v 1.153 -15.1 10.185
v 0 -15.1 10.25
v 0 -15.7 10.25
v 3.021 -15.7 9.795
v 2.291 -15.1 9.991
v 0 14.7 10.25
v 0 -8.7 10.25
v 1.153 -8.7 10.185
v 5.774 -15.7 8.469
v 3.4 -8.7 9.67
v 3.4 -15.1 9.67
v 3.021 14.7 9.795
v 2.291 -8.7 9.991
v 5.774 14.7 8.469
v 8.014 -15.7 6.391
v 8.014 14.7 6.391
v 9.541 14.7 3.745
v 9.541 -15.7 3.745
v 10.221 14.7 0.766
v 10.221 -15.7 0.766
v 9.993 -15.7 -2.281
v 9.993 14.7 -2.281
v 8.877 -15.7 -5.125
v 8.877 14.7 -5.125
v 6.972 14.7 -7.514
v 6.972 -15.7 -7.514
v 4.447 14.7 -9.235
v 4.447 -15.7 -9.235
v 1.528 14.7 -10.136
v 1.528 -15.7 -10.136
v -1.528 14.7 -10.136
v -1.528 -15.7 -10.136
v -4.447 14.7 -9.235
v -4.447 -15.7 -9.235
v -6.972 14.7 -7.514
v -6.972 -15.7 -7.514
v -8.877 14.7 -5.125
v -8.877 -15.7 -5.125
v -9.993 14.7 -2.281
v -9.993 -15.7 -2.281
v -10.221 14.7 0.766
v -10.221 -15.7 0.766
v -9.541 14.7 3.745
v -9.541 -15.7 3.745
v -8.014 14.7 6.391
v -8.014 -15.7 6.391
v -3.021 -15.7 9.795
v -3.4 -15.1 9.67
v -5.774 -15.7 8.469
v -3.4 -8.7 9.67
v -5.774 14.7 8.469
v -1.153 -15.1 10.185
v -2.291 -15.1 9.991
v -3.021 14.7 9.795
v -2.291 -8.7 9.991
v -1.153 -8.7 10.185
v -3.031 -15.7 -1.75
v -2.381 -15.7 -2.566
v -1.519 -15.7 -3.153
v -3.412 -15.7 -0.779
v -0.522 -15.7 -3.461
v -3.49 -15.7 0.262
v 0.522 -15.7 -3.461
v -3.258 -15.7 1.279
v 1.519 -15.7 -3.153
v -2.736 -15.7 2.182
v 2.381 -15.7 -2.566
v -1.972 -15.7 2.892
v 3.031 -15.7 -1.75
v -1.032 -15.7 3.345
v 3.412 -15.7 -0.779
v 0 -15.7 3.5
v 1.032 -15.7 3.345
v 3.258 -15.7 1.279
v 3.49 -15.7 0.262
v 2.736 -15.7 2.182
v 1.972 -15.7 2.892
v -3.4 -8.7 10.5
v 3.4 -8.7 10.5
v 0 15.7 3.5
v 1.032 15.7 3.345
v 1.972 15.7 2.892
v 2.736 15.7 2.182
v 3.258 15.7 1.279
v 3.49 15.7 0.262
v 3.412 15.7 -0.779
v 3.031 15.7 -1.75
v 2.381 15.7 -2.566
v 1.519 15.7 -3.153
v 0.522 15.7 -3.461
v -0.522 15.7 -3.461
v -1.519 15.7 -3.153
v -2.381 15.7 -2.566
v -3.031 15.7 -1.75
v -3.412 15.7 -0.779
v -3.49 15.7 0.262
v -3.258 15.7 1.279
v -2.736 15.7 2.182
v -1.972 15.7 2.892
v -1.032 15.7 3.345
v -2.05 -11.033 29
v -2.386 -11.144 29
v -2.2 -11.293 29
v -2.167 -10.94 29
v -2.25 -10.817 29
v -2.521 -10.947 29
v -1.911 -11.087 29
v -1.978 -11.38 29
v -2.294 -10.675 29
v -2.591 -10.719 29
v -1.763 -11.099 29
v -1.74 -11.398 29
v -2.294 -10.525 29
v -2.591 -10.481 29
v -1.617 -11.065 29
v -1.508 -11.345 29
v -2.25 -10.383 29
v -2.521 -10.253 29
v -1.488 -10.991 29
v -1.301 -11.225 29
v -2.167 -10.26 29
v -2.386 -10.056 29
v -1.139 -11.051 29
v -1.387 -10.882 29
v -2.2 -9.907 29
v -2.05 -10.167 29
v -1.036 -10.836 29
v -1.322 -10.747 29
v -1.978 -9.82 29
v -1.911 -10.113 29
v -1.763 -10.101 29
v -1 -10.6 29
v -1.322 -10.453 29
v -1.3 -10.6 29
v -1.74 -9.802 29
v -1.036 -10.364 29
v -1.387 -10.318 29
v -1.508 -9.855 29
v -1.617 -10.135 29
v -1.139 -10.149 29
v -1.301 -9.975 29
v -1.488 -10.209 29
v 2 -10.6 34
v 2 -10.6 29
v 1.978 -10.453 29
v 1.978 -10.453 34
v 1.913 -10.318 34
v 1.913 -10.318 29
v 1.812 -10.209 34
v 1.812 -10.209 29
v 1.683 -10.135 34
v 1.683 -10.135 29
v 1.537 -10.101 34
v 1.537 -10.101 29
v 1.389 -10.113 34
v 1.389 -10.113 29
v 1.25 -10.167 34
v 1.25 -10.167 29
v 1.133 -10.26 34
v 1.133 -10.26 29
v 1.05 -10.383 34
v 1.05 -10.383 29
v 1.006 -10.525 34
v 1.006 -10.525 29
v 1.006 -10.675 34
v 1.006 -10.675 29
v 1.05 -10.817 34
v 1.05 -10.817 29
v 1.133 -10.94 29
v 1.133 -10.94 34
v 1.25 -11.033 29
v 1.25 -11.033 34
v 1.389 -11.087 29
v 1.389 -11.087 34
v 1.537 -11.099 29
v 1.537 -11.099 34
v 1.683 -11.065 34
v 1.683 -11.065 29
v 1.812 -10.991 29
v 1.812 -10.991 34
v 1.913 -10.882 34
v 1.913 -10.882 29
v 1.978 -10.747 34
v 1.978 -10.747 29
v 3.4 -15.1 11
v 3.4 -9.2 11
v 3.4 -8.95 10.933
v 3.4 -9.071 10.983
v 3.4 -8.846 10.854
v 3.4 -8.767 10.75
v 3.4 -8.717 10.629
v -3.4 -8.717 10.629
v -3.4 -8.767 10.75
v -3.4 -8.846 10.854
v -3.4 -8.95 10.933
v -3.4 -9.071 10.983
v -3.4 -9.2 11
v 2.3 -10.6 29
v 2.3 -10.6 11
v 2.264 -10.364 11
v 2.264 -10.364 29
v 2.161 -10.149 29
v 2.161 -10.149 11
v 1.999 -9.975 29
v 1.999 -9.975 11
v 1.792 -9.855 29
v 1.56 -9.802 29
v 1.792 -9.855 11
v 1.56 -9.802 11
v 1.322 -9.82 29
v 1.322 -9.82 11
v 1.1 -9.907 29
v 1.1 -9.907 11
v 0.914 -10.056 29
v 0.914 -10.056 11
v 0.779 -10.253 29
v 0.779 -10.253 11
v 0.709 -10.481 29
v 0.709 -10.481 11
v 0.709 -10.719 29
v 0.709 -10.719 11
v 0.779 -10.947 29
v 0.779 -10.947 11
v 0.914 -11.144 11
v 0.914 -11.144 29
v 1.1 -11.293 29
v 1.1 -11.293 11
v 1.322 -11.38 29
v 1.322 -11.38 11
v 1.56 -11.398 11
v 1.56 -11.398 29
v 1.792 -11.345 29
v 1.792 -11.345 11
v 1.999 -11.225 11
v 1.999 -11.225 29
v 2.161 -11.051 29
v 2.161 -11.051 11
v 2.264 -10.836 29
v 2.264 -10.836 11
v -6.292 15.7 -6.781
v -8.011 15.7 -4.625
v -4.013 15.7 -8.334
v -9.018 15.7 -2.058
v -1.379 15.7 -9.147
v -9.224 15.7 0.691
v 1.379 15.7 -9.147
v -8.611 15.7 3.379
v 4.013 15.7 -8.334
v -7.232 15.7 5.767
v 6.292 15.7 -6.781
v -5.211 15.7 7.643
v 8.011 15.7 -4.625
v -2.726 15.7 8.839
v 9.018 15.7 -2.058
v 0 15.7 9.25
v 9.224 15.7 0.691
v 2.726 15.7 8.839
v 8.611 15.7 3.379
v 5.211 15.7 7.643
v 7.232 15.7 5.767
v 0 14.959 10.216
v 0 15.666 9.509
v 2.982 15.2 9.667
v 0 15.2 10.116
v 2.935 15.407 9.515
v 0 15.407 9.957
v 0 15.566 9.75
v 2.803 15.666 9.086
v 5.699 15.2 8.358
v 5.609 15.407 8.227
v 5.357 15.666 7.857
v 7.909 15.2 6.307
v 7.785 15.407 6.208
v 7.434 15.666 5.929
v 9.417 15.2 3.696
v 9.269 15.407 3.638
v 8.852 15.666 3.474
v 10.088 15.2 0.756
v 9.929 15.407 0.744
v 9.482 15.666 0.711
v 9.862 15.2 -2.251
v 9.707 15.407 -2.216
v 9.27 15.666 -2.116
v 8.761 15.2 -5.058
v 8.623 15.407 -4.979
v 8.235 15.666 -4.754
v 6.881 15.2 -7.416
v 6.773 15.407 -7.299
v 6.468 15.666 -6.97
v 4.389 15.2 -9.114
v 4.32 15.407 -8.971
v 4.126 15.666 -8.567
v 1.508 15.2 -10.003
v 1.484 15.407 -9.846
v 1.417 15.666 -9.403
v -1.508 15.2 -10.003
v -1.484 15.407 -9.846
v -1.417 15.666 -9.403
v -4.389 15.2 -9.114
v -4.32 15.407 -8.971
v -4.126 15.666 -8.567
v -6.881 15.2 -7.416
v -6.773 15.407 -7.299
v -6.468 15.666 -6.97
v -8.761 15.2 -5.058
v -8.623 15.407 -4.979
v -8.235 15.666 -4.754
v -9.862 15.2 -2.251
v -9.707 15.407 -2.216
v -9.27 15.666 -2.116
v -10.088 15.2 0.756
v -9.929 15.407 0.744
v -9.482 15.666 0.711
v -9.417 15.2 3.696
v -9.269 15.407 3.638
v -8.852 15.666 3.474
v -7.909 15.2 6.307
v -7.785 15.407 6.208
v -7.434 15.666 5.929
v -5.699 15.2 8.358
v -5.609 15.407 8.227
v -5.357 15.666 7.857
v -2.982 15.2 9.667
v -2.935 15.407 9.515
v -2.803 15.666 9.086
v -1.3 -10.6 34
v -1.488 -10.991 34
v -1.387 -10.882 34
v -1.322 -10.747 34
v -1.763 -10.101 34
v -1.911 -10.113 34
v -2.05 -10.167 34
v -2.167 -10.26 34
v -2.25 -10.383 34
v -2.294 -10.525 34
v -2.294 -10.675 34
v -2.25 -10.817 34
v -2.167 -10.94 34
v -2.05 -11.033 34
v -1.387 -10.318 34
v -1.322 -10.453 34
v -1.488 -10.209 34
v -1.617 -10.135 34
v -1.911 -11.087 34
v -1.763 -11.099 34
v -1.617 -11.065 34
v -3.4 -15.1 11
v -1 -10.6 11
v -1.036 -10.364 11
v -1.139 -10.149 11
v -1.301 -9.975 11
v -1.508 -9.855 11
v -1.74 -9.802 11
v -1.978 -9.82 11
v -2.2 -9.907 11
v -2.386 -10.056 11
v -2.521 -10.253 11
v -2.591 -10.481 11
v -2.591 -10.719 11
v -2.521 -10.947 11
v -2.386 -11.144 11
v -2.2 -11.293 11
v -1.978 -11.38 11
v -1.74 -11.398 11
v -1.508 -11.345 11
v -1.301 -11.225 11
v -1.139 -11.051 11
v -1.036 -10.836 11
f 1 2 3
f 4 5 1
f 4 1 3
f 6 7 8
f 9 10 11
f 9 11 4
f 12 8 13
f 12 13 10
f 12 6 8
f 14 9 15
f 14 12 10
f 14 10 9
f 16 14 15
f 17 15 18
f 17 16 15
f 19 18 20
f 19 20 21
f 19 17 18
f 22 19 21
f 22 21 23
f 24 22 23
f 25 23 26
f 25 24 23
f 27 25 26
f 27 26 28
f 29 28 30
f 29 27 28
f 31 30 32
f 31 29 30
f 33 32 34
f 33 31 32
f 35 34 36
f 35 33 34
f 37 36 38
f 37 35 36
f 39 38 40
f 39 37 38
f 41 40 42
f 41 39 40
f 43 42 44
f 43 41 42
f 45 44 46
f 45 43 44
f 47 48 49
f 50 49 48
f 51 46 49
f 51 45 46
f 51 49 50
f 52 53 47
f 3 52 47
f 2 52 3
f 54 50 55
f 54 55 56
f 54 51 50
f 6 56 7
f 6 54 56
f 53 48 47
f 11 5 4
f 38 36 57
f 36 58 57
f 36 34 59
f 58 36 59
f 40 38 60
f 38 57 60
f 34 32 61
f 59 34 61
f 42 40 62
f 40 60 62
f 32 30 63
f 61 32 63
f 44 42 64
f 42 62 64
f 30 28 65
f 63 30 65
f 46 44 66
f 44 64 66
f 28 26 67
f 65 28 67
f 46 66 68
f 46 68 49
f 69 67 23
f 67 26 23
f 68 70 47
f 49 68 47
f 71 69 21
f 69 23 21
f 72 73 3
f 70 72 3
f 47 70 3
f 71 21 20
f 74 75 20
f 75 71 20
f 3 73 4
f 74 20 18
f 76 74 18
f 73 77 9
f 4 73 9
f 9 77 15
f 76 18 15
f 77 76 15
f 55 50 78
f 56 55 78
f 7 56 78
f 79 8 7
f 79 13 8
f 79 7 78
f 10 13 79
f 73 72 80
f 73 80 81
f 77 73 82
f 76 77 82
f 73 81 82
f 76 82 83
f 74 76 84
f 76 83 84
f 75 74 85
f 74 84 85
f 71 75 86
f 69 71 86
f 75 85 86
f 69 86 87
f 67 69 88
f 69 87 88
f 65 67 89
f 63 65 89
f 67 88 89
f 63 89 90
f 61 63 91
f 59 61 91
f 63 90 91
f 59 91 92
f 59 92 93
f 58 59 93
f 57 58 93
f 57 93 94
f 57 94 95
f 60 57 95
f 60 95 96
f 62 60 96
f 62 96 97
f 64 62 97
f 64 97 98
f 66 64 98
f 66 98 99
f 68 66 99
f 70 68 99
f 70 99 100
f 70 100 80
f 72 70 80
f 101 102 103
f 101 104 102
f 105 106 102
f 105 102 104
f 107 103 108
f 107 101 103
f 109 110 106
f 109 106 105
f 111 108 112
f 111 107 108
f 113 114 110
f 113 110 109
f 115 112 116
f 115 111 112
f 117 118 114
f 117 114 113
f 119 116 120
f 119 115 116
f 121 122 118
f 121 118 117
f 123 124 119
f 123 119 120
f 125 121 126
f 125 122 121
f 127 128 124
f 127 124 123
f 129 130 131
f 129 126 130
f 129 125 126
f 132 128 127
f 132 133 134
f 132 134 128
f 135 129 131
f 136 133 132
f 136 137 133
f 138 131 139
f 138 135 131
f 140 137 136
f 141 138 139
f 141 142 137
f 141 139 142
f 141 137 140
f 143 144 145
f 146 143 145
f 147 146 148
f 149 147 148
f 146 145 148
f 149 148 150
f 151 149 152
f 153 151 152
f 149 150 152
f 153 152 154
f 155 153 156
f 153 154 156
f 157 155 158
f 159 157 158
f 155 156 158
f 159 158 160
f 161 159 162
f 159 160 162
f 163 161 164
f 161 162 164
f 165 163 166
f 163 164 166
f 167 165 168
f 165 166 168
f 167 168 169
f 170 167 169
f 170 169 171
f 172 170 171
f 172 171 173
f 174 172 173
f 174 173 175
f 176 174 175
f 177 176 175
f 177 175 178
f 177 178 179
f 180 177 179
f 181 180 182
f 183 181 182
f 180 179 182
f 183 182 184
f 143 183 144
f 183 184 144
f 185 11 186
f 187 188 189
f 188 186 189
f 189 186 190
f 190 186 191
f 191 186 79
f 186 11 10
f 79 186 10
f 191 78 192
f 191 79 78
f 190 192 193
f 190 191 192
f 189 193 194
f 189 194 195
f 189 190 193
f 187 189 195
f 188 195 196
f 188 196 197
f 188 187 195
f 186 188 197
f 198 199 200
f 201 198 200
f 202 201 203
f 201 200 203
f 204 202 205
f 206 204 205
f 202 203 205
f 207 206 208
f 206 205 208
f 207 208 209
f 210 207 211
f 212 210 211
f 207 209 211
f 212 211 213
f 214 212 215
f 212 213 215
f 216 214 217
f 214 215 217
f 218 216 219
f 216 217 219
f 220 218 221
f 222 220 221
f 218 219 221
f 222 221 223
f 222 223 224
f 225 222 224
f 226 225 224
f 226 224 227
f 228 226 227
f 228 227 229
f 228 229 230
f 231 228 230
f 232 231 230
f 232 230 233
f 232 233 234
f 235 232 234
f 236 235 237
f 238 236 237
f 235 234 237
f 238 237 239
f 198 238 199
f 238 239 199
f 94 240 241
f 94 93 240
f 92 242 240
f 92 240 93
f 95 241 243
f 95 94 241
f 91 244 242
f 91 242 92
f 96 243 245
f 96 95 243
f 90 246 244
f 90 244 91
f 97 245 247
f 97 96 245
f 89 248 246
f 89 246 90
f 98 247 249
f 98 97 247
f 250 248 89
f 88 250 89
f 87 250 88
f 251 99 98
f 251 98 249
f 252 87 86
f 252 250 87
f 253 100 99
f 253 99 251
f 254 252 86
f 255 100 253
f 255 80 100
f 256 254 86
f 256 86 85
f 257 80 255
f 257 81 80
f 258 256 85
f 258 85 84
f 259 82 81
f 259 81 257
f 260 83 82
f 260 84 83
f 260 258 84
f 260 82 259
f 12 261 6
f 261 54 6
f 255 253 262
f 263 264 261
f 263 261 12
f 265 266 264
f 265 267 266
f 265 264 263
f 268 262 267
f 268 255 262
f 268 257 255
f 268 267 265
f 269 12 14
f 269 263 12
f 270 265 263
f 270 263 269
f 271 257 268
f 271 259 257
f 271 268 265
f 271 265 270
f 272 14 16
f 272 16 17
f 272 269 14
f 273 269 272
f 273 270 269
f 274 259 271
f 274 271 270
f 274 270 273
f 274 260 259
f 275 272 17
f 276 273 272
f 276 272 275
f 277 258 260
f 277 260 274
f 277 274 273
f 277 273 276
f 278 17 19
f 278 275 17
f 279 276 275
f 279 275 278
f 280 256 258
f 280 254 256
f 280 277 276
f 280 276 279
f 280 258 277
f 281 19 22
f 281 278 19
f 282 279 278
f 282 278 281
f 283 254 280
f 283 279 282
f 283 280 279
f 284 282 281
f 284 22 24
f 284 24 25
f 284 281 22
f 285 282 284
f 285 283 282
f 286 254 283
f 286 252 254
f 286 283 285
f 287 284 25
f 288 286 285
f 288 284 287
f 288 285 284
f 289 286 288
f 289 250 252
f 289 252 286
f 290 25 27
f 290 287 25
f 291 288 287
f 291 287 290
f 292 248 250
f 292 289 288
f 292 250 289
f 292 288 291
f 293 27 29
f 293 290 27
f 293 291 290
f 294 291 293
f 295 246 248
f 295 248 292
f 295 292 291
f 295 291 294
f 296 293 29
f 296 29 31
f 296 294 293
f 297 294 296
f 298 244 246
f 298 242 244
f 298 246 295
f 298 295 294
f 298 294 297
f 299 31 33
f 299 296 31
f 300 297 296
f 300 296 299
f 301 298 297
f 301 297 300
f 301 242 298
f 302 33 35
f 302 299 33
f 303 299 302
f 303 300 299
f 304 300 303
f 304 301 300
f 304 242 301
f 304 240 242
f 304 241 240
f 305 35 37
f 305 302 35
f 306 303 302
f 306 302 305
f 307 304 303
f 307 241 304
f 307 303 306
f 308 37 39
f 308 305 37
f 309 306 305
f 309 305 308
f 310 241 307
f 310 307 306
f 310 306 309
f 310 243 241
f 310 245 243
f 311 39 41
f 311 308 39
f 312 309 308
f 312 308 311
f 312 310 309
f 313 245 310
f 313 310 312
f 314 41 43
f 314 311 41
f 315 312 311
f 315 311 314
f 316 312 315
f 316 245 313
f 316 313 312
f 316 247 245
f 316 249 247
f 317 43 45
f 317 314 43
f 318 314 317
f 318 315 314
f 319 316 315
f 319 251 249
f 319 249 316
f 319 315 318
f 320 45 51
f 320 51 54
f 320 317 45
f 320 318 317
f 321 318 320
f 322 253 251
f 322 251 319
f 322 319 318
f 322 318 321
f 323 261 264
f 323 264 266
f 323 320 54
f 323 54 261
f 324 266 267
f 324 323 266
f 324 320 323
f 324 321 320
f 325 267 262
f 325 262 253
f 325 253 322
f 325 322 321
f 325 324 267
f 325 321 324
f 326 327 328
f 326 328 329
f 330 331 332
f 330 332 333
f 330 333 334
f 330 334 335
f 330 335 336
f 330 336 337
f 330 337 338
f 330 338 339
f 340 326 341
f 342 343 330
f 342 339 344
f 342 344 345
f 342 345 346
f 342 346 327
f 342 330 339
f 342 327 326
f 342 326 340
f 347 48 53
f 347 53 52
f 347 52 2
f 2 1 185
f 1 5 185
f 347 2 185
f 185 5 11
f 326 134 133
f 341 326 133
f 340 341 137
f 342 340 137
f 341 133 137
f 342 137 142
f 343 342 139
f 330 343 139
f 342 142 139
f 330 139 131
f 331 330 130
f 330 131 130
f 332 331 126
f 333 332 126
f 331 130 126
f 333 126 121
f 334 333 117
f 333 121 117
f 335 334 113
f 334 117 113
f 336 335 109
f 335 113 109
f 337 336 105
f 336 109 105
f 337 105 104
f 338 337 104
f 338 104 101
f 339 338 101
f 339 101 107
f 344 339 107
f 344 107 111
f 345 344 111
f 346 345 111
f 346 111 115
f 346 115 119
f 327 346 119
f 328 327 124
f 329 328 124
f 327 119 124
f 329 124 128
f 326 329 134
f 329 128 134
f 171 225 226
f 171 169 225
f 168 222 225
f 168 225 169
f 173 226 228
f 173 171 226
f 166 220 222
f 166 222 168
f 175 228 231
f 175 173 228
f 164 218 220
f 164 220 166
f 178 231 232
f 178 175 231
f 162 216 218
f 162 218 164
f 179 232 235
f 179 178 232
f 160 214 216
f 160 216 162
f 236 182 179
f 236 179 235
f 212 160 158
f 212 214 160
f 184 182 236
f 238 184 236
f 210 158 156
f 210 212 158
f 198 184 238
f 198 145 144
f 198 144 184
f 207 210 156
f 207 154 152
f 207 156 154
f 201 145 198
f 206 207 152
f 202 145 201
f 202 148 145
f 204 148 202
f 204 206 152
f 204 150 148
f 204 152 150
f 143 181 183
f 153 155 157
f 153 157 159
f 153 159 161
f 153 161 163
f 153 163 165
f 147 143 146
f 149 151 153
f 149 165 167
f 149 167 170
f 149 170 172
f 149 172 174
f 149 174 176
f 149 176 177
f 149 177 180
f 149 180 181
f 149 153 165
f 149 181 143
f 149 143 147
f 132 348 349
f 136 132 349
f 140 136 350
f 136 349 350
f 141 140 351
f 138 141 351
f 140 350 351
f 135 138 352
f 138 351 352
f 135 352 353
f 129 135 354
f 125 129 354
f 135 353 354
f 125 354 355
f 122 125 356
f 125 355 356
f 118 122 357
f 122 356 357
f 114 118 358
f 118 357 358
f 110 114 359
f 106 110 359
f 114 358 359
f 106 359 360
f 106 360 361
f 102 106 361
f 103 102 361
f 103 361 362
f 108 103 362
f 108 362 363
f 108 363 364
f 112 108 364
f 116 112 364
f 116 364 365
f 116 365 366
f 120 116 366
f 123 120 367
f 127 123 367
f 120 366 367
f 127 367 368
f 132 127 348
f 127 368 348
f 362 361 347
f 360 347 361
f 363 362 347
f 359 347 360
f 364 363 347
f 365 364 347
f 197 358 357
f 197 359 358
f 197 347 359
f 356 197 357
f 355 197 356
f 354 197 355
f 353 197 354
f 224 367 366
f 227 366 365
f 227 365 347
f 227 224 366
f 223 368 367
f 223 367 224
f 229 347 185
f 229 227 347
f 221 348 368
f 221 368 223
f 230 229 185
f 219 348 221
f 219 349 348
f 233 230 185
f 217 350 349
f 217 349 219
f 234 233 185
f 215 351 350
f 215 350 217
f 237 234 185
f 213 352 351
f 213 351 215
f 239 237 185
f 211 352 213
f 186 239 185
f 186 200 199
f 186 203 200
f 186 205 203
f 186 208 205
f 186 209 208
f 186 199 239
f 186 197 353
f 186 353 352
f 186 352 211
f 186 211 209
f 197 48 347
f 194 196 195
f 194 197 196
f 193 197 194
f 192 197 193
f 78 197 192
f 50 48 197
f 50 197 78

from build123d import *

# Parameters (mm, degrees)
BASE_SKETCH_R       = 10.25
BASE_EXTRUDE_DEPTH  = 15.7
BODY_FILLET_R       = 1
WIRE_BASE_SKETCH_W  = 6.8
WIRE_BASE_SKETCH_H  = 6.4
WIRE_BASE_DEPTH     = 11
WIRE_BASE_FILLET_R  = 0.5
WIRE_START_SKETCH_R = 0.8
WIRE_START_DEPTH    = 18
WIRE_END_SKETCH_R   = 0.5
WIRE_END_DEPTH      = 5
THRU_HOLE_SKETCH_R  = 3.5
THRU_HOLE_DEPTH     = 48.402768906


with BuildPart() as part:
    # Base Sketch → Base Extrude (new, symmetric)
    with BuildSketch(Plane(origin=(0, 0, 0), x_dir=(1, 0, 0), z_dir=(0, 1, 0))):
        with Locations(Location((0, 0, 0), (0, 0, 270))):
            Circle(BASE_SKETCH_R)
    extrude(amount=BASE_EXTRUDE_DEPTH, both=True)

    # Body Fillet
    body_fillet_edges = [part.edges().sort_by_distance(p)[0] for p in [
        (0, 15.7, -10.25),
    ]]
    fillet(body_fillet_edges, radius=BODY_FILLET_R)

    # Wire Base Sketch → Wire Base (add)
    with BuildSketch(Plane.XY):
        with Locations((0, -11.9)):
            Rectangle(WIRE_BASE_SKETCH_W, WIRE_BASE_SKETCH_H)
    extrude(amount=WIRE_BASE_DEPTH)

    # Wire Base Fillet
    wire_base_fillet_edges = [part.edges().sort_by_distance(p)[0] for p in [
        (0, -8.7, 11),
    ]]
    fillet(wire_base_fillet_edges, radius=WIRE_BASE_FILLET_R)

    # Wire Start Sketch → Wire Start (add)
    with BuildSketch(Plane.XY.offset(11)):
        with Locations((-1.8, -10.6)):
            Circle(WIRE_START_SKETCH_R)
        with Locations((1.5, -10.6)):
            Circle(WIRE_START_SKETCH_R)
    extrude(amount=WIRE_START_DEPTH)

    # Wire End Sketch → Wire End (add)
    with BuildSketch(Plane.XY.offset(29)):
        with Locations((1.5, -10.6)):
            Circle(WIRE_END_SKETCH_R)
        with Locations((-1.8, -10.6)):
            Circle(WIRE_END_SKETCH_R)
    extrude(amount=WIRE_END_DEPTH)

    # Thru Hole Sketch → Thru Hole (cut, through all)
    with BuildSketch(Plane(origin=(0, 15.7, 0), x_dir=(1, 0, 0), z_dir=(0, 1, 0))):
        with Locations(Location((0, 0, 0), (0, 0, 270))):
            Circle(THRU_HOLE_SKETCH_R)
    extrude(amount=-THRU_HOLE_DEPTH, mode=Mode.SUBTRACT)


solid = part.part
